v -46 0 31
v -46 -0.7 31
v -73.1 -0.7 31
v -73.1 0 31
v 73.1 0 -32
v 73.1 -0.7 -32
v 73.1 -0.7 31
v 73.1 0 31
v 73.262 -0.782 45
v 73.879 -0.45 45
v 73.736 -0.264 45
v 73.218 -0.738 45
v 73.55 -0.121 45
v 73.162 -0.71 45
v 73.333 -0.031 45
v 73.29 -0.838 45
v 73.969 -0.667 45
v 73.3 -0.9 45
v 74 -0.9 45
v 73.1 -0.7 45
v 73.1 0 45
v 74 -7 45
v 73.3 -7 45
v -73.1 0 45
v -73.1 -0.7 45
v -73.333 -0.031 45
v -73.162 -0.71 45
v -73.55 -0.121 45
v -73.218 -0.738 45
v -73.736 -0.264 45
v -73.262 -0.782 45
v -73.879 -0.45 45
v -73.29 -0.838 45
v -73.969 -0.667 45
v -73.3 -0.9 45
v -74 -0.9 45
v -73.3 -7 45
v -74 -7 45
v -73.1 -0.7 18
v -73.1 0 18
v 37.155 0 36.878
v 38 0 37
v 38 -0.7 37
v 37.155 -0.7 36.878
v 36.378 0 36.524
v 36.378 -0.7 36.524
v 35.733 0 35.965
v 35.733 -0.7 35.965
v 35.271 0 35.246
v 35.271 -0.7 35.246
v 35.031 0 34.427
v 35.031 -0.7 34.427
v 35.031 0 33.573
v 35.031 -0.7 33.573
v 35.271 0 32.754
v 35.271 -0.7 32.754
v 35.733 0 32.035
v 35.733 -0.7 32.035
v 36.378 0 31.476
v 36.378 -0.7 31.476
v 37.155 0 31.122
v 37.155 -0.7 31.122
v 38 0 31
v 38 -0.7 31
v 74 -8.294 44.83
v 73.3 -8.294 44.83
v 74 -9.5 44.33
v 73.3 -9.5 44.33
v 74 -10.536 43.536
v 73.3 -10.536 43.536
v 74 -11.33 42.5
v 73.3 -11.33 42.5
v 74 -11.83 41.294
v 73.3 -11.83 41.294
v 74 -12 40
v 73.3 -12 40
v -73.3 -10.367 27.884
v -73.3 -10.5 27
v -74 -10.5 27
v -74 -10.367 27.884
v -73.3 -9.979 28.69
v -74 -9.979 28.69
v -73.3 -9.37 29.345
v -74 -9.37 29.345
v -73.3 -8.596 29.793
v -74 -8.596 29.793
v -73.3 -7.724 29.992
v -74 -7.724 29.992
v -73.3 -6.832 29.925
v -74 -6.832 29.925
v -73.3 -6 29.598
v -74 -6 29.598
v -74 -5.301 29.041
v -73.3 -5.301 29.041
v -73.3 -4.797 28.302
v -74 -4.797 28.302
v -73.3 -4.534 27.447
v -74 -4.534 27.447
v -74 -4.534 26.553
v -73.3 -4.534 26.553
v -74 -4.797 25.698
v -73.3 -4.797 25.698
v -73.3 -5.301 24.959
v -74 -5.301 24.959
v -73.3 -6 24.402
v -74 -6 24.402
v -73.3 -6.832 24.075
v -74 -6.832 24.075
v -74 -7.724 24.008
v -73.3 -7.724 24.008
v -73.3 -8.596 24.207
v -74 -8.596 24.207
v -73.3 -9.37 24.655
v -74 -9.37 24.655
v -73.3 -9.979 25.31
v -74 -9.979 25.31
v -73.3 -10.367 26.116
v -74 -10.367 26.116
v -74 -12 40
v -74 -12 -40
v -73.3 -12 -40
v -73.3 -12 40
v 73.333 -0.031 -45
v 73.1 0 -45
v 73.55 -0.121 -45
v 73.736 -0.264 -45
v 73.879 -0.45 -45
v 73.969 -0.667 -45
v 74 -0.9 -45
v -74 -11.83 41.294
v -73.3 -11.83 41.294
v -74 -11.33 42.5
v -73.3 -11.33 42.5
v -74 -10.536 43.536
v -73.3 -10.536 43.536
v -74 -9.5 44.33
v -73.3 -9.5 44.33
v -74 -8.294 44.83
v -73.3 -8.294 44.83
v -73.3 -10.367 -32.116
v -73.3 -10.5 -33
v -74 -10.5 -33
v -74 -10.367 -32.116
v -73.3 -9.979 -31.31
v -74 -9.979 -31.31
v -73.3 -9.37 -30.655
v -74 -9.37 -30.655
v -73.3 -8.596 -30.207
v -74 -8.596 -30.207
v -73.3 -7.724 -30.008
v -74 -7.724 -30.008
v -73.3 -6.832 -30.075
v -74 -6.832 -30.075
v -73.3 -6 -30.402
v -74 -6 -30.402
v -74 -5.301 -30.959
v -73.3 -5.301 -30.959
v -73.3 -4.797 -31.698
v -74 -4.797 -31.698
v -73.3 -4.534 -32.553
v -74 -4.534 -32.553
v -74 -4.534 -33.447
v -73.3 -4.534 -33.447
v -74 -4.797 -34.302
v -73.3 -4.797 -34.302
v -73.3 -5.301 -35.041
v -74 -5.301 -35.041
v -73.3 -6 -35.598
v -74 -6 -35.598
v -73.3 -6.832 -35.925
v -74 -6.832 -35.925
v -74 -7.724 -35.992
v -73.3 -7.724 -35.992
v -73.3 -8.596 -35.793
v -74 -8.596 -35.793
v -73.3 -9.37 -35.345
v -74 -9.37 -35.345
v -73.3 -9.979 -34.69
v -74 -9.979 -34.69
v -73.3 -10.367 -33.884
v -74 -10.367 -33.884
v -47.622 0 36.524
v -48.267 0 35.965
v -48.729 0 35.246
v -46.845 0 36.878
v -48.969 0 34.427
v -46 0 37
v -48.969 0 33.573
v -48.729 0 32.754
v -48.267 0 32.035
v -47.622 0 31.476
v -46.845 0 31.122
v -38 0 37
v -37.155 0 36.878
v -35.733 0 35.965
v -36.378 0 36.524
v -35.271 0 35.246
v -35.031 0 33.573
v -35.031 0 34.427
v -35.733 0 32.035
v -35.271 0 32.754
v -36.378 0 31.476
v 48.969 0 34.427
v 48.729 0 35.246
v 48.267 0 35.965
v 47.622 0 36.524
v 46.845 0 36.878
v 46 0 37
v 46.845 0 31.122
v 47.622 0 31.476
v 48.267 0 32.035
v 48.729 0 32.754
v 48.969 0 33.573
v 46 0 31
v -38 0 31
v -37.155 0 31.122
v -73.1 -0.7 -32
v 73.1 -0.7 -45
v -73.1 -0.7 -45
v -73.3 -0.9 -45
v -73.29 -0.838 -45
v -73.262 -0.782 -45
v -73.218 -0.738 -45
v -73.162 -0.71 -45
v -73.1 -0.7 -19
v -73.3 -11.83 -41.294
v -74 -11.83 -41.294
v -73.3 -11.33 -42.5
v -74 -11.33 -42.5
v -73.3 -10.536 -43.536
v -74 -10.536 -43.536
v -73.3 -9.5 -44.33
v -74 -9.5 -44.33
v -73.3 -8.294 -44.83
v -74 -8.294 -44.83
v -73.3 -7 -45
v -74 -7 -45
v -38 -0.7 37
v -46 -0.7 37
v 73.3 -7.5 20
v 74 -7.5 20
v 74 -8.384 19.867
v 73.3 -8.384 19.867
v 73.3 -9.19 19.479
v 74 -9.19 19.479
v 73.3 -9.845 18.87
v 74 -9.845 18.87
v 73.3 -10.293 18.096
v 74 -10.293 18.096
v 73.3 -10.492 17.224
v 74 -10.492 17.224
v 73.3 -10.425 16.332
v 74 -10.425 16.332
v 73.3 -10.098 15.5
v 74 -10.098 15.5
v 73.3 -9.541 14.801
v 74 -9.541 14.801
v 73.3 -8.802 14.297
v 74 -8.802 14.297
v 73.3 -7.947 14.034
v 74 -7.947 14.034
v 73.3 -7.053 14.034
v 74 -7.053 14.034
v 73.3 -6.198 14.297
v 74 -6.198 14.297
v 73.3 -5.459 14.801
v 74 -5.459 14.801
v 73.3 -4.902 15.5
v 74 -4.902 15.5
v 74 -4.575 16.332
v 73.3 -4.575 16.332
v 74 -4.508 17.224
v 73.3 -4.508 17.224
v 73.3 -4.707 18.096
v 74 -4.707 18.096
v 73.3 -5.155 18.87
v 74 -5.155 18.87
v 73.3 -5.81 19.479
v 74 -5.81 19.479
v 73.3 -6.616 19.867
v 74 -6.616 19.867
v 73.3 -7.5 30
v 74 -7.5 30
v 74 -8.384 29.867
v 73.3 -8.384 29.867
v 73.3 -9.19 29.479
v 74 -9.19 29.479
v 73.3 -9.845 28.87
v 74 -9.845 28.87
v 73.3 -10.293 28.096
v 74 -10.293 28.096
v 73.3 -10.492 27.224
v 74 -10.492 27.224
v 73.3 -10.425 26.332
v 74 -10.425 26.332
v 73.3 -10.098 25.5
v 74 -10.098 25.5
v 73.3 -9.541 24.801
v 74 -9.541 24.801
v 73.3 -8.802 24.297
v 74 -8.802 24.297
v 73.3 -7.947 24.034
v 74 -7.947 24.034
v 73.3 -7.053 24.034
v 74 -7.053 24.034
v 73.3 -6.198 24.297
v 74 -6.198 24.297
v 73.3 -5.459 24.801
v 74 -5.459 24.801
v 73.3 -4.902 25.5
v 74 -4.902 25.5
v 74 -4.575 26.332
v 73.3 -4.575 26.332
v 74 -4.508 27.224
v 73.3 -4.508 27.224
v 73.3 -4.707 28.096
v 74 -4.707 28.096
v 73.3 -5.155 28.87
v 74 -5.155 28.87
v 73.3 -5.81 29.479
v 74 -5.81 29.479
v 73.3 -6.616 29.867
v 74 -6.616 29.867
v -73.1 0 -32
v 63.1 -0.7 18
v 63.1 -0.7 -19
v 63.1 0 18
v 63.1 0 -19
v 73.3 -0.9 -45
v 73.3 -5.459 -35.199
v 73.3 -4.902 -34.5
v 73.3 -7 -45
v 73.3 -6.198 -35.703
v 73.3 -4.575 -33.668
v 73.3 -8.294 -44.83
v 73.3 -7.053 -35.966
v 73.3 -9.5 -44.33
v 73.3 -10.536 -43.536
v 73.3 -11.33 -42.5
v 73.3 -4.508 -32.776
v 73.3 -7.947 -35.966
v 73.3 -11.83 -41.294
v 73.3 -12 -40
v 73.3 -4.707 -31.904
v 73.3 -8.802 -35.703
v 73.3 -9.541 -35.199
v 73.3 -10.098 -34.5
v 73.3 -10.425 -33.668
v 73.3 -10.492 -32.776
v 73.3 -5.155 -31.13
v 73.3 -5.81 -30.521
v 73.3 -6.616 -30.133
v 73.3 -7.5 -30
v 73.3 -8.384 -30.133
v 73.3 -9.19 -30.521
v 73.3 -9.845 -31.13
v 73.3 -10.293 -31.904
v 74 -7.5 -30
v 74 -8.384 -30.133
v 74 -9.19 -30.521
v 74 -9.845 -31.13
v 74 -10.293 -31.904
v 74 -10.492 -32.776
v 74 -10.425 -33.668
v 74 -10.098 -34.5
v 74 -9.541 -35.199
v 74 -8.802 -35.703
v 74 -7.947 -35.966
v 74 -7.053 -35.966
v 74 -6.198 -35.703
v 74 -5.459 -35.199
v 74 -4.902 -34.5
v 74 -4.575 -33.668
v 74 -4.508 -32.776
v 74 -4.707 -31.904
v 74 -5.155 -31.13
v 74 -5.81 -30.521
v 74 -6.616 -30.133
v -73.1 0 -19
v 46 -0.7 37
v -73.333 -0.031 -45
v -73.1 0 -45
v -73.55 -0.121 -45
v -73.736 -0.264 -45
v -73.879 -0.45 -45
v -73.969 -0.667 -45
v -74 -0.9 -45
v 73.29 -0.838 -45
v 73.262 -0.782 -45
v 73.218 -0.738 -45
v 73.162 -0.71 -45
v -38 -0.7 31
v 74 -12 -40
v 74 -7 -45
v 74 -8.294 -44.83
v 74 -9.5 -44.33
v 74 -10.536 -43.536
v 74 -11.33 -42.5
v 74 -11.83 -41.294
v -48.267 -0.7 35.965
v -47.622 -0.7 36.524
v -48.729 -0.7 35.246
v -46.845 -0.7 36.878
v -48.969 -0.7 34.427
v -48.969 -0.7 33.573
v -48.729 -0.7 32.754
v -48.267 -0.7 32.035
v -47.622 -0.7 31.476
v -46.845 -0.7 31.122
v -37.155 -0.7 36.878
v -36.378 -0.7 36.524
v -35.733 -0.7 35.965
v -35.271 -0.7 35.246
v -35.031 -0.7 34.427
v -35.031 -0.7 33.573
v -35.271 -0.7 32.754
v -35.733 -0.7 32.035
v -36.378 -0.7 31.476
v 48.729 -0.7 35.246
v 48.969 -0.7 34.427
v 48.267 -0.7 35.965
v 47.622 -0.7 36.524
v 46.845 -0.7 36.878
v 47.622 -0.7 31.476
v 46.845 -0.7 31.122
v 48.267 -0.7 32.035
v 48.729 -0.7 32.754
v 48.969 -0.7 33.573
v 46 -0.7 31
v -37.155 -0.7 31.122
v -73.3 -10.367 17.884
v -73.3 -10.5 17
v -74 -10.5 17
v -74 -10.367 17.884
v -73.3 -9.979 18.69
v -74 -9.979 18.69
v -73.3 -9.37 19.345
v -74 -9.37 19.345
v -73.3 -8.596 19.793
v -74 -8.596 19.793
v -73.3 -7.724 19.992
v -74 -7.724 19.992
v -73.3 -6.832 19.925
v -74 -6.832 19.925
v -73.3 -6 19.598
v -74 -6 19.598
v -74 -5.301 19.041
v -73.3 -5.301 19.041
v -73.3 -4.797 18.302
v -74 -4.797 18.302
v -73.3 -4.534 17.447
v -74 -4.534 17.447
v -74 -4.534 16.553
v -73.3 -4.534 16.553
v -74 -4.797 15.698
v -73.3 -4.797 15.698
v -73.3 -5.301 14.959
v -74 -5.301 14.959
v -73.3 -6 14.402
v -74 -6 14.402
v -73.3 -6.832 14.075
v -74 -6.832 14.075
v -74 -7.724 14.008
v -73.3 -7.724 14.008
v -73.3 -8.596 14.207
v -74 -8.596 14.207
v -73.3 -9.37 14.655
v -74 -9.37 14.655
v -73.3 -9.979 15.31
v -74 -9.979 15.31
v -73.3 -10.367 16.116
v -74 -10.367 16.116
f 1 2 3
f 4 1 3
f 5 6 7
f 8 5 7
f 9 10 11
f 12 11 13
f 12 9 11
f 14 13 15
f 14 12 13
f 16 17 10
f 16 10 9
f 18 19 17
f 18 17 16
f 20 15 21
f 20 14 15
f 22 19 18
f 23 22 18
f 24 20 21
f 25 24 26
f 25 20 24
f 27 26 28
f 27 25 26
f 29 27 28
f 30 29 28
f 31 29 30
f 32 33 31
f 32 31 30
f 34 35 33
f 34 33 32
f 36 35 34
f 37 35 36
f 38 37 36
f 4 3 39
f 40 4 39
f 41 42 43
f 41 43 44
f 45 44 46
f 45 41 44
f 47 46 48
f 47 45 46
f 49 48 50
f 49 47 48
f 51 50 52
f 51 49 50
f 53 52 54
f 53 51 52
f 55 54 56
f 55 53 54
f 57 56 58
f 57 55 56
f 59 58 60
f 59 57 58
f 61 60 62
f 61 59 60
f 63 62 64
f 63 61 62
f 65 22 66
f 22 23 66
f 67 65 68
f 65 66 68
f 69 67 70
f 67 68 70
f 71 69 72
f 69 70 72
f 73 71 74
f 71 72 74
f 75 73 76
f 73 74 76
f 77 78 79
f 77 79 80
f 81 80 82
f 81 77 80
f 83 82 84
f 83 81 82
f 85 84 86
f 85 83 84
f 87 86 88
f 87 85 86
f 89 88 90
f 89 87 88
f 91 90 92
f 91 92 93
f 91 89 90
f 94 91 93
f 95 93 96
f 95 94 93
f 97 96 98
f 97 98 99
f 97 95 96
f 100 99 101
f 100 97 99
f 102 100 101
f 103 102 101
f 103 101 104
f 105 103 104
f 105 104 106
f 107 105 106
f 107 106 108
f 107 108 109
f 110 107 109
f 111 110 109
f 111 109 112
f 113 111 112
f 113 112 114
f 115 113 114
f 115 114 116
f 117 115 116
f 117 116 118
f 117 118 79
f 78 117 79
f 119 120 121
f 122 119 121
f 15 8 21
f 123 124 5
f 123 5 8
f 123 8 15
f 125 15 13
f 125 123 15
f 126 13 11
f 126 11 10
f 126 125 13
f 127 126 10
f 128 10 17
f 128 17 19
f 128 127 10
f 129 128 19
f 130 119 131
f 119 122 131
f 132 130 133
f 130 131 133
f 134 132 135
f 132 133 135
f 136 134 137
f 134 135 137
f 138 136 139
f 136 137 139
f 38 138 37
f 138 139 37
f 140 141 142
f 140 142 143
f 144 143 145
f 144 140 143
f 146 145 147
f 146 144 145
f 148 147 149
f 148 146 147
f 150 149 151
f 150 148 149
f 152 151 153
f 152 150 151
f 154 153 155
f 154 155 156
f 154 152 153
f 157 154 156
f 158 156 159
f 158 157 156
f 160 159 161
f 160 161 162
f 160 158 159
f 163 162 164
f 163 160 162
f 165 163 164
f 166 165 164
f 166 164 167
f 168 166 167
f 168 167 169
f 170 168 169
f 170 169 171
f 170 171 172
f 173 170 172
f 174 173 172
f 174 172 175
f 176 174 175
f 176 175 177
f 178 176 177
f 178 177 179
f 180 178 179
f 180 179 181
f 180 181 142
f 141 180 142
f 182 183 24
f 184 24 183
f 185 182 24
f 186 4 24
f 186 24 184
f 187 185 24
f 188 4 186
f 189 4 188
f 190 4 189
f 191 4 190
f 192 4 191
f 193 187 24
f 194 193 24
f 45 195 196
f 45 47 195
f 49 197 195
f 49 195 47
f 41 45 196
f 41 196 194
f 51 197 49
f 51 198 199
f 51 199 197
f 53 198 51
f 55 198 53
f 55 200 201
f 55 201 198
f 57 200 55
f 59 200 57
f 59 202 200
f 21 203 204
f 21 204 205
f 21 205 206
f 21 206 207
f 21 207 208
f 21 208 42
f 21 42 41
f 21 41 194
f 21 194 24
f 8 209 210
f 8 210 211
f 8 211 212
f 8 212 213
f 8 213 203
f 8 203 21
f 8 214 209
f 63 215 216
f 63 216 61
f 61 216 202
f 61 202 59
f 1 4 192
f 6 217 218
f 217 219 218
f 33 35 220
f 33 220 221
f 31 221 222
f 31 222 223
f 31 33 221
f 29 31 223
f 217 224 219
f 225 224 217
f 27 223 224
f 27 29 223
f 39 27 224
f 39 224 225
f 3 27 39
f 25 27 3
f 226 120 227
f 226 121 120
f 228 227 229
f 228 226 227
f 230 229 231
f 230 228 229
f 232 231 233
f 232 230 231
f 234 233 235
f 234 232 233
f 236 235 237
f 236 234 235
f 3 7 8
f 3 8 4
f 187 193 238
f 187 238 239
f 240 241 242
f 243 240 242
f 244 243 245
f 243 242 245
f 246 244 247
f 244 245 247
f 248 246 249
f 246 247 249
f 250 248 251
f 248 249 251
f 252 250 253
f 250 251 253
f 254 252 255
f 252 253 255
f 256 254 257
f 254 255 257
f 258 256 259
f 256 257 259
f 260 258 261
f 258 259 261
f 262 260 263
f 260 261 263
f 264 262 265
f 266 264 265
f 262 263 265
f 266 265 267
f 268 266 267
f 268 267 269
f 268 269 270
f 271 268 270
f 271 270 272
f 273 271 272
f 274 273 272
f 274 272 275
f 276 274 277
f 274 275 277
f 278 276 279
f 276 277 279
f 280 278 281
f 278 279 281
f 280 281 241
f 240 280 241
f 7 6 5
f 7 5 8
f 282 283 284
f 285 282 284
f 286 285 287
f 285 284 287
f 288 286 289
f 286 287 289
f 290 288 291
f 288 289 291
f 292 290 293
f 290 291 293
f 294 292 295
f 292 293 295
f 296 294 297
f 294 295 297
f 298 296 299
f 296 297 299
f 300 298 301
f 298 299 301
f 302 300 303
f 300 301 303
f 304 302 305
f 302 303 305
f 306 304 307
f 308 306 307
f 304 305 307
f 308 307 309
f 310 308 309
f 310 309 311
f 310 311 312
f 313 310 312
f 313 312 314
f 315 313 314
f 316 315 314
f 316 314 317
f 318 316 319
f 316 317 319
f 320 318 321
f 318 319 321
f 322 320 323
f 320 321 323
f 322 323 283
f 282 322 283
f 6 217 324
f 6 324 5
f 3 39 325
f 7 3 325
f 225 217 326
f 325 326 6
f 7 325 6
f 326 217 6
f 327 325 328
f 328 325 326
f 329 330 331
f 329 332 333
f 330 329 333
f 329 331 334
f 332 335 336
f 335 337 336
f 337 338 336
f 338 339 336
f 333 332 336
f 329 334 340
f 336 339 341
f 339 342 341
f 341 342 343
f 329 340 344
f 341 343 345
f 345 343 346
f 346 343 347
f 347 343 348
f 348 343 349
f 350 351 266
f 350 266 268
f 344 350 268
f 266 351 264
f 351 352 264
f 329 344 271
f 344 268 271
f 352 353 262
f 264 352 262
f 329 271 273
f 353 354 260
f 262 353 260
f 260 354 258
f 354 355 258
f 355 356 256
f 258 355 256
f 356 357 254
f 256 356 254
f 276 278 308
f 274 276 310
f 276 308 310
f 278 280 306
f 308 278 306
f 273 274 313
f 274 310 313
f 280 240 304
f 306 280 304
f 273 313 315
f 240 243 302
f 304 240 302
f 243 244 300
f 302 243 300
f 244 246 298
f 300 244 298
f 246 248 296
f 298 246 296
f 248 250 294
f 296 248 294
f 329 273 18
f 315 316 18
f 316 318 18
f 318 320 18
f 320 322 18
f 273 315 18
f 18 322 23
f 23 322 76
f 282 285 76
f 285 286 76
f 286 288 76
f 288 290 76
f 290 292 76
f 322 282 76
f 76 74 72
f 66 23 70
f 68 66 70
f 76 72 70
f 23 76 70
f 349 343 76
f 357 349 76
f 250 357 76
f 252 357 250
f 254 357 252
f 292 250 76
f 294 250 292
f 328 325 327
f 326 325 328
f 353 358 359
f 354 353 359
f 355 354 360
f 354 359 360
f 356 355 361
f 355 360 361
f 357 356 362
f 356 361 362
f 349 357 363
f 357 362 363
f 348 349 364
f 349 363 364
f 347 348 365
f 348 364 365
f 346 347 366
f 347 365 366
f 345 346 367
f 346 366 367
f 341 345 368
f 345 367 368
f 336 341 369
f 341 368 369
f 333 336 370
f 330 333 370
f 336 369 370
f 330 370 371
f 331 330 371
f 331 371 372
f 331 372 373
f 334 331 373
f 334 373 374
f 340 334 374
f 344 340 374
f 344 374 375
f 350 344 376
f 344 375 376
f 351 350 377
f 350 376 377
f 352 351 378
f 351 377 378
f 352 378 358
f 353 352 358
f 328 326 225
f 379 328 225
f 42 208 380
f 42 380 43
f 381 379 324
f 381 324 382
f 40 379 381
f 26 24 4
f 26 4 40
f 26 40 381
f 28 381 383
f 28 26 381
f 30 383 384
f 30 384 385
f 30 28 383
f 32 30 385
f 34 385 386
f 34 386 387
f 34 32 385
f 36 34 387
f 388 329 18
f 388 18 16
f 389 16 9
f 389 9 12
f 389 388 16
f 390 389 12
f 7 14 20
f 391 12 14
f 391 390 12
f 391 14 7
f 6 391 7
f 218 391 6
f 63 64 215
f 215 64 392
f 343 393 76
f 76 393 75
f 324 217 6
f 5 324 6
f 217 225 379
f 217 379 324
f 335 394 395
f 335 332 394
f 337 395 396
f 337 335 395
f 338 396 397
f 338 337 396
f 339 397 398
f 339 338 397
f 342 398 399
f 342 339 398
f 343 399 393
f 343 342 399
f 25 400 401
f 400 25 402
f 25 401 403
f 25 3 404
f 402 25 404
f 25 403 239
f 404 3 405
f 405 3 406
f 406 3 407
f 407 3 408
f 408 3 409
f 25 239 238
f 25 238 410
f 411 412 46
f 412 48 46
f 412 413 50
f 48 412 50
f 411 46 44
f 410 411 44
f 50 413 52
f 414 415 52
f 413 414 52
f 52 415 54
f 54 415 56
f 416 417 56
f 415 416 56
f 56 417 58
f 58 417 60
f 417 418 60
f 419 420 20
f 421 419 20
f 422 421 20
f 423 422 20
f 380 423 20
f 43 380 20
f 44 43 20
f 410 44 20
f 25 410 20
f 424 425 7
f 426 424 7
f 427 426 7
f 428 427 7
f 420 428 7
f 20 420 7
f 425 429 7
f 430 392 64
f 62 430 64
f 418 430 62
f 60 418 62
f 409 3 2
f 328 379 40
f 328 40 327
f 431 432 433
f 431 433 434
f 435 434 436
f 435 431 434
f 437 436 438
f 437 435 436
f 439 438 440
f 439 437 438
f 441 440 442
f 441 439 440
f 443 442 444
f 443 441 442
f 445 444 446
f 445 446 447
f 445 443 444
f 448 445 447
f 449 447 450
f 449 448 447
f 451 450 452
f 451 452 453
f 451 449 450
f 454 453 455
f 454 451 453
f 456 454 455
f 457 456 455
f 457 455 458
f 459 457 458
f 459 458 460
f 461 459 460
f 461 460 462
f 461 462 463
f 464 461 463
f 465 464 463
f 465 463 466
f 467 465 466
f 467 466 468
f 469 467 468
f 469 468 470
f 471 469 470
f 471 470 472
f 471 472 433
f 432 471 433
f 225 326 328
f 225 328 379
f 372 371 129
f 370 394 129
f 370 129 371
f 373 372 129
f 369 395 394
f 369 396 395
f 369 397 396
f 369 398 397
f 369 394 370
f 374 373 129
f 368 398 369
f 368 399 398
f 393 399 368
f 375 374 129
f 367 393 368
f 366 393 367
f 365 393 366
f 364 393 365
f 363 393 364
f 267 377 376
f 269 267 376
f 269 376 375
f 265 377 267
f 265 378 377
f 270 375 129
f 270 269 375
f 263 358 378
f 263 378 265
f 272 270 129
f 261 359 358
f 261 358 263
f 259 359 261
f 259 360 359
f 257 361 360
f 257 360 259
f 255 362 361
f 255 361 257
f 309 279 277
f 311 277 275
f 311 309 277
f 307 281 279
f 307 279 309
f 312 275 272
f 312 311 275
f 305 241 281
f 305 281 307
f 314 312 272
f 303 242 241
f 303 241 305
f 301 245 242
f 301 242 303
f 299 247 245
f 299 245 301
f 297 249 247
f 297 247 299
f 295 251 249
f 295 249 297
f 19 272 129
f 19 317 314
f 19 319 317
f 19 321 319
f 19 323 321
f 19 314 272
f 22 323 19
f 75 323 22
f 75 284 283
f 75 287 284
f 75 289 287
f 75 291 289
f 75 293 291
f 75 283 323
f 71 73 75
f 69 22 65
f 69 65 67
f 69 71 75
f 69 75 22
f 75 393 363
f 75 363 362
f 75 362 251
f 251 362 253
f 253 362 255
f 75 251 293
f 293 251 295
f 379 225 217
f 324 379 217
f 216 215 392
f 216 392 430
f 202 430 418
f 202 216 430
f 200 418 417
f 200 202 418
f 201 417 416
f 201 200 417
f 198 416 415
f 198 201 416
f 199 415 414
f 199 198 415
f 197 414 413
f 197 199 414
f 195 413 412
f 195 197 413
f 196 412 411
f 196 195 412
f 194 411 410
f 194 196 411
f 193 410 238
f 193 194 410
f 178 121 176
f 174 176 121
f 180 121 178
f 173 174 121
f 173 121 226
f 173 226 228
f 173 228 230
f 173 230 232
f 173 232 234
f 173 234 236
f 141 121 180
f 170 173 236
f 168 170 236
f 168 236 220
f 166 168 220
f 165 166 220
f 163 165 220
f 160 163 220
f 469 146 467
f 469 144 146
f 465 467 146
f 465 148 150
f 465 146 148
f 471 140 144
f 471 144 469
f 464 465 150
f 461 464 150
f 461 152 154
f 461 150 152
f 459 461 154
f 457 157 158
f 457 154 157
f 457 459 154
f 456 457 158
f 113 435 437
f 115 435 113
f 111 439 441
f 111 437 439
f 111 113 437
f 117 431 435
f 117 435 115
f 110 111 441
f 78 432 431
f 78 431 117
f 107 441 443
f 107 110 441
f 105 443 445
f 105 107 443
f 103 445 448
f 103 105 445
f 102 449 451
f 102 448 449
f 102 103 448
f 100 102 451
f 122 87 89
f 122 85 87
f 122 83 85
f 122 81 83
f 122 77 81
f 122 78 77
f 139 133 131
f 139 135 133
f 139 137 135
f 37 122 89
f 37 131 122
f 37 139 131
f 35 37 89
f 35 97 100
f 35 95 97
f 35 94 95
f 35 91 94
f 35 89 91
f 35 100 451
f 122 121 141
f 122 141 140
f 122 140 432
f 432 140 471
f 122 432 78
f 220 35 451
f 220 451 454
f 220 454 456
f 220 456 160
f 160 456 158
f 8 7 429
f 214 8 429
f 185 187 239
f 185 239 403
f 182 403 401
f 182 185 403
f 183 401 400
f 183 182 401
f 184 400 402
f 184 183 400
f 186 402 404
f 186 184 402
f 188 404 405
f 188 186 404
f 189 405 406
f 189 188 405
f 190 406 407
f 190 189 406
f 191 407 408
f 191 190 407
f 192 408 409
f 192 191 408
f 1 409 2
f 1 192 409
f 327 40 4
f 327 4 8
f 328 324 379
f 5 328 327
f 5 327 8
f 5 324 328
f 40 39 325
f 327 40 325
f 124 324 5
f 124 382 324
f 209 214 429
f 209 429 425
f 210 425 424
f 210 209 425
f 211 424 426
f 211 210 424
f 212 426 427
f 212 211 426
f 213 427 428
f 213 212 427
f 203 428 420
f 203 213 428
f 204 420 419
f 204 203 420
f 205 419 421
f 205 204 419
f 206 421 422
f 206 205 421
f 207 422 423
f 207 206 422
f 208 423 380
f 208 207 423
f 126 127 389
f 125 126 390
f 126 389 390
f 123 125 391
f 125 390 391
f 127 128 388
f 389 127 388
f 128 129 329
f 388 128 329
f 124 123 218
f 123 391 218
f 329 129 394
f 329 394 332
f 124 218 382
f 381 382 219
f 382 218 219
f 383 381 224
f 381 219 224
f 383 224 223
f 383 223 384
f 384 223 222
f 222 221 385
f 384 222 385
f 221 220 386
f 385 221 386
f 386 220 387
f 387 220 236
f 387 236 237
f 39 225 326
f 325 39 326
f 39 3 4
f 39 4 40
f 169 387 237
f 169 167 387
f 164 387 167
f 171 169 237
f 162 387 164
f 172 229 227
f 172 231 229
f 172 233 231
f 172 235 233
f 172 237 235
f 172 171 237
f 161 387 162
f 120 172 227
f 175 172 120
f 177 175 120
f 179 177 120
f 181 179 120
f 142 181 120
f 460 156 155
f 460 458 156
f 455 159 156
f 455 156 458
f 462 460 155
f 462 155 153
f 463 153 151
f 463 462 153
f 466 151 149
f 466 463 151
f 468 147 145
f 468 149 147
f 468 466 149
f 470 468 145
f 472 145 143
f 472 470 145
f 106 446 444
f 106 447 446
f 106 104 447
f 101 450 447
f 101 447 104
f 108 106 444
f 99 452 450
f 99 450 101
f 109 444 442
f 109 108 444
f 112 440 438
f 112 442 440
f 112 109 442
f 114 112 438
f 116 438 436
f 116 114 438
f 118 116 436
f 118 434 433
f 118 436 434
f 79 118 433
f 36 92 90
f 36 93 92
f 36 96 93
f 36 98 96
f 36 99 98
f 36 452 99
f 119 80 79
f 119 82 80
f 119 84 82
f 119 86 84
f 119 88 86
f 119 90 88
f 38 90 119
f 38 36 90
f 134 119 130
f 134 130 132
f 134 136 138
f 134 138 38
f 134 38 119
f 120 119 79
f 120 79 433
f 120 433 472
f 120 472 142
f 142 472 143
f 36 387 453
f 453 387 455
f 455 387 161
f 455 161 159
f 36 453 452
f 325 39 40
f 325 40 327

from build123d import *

# Parameters (mm, degrees)
SKETCH_1_W                         = 148
SKETCH_1_H                         = 90
SM_BASE_FLANGE_1_DEPTH             = 0.7
SM_EDGE_FLANGE_1_STRIP_W           = 3.2
SM_EDGE_FLANGE_1_STRIP_H           = 0.7
SM_EDGE_FLANGE_1_STRIP_CUT_DEPTH   = 90
SM_EDGE_FLANGE_1_STRIP_2_W         = 3.2
SM_EDGE_FLANGE_1_STRIP_2_H         = 0.7
SM_EDGE_FLANGE_1_STRIP_CUT_2_DEPTH = 90
SM_EDGE_FLANGE_1_DEPTH             = 90
SM_EDGE_FLANGE_1_PROFILE_W         = 90
SM_EDGE_FLANGE_1_PROFILE_H         = 11.1
SM_EDGE_FLANGE_1_PROFILE_R         = 3
SM_EDGE_FLANGE_1_FLAT_DEPTH        = 0.7
SM_EDGE_FLANGE_1_BEND_DEPTH        = 90
FILLET_2_R                         = 5
CUT_EXTRUDE_START                  = -10
SKETCH_15_R                        = 3
CUT_EXTRUDE_1_DEPTH                = 10
SPLIT_BODIES_1_SURFACE_1_BACK      = 174.632
SPLIT_BODIES_1_SURFACE_1_DEPTH     = 349.264
SPLIT_BODIES_1_SURFACE_2_BACK      = 174.632
SPLIT_BODIES_1_SURFACE_2_DEPTH     = 349.264


# Sheet-metal steps are written as plain solids
with BuildPart() as part:
    # Sketch 1 → 基体-法兰1 (new body)
    with BuildSketch(Plane(origin=(0, 0, 0), x_dir=(1, 0, 0), z_dir=(0, 1, 0))):
        Rectangle(SKETCH_1_W, SKETCH_1_H)
        with BuildLine():
            Line((-46, -31), (-38, -31))
            ThreePointArc((-38, -31), (-35, -34), (-38, -37))
            Line((-38, -37), (-46, -37))
            ThreePointArc((-46, -37), (-49, -34), (-46, -31))
        make_face(mode=Mode.SUBTRACT)
        with BuildLine():
            Line((38, -31), (46, -31))
            ThreePointArc((46, -31), (49, -34), (46, -37))
            Line((46, -37), (38, -37))
            ThreePointArc((38, -37), (35, -34), (38, -31))
        make_face(mode=Mode.SUBTRACT)
    extrude(amount=-SM_BASE_FLANGE_1_DEPTH)

    # 边线-法兰1 strip (across the edge) → 边线-法兰1 strip cut (cut)
    with BuildSketch(Plane(origin=(74, -0.7, -45), x_dir=(-1, 0, 0), z_dir=(0, 0, 1))):
        with Locations((-0.7, -0.35)):
            Rectangle(SM_EDGE_FLANGE_1_STRIP_W, SM_EDGE_FLANGE_1_STRIP_H)
    extrude(amount=SM_EDGE_FLANGE_1_STRIP_CUT_DEPTH, mode=Mode.SUBTRACT)

    # 边线-法兰1 strip 2 (across the edge) → 边线-法兰1 strip cut 2 (cut)
    with BuildSketch(Plane(origin=(-74, -0.7, 45), x_dir=(1, 0, 0), z_dir=(0, 0, -1))):
        with Locations((-0.7, -0.35)):
            Rectangle(SM_EDGE_FLANGE_1_STRIP_2_W, SM_EDGE_FLANGE_1_STRIP_2_H)
    extrude(amount=SM_EDGE_FLANGE_1_STRIP_CUT_2_DEPTH, mode=Mode.SUBTRACT)

    # 边线-法兰1 bend section (across the edge) → 边线-法兰1 (add)
    with BuildSketch(Plane(origin=(74, -0.7, -45), x_dir=(-1, 0, 0), z_dir=(0, 0, 1))):
        with BuildLine():
            Line((0, 0.2), (0.7, 0.2))
            ThreePointArc((0.7, 0.2), (0.758578644, 0.058578644), (0.9, 0))
            Line((0.9, 0), (0.9, -0.7))
            ThreePointArc((0.9, -0.7), (0.263603897, -0.436396103), (0, 0.2))
        make_face()
    extrude(amount=SM_EDGE_FLANGE_1_DEPTH)

    # 边线-法兰1 profile (on flange) → 边线-法兰1 flat (add)
    with BuildSketch(Plane(origin=(74, -0.7, 0), x_dir=(0, 0, 1), z_dir=(1, 0, 0))):
        with Locations((0, 5.75)):
            Rectangle(SM_EDGE_FLANGE_1_PROFILE_W, SM_EDGE_FLANGE_1_PROFILE_H)
        with Locations((17, 6.8)):
            Circle(SM_EDGE_FLANGE_1_PROFILE_R, mode=Mode.SUBTRACT)
        with Locations((27, 6.8)):
            Circle(SM_EDGE_FLANGE_1_PROFILE_R, mode=Mode.SUBTRACT)
        with Locations((-33, 6.8)):
            Circle(SM_EDGE_FLANGE_1_PROFILE_R, mode=Mode.SUBTRACT)
    extrude(amount=-SM_EDGE_FLANGE_1_FLAT_DEPTH)

    # 边线-法兰1 section (across the edge) → 边线-法兰1 bend (add)
    with BuildSketch(Plane(origin=(-74, -0.7, 45), x_dir=(1, 0, 0), z_dir=(0, 0, -1))):
        with BuildLine():
            Line((0, 0.2), (0, 11.3))
            Line((0, 11.3), (0.7, 11.3))
            Line((0.7, 11.3), (0.7, 0.2))
            ThreePointArc((0.7, 0.2), (0.758578644, 0.058578644), (0.9, 0))
            Line((0.9, 0), (0.9, -0.7))
            ThreePointArc((0.9, -0.7), (0.263603897, -0.436396103), (0, 0.2))
        make_face()
    extrude(amount=SM_EDGE_FLANGE_1_BEND_DEPTH)

    # 圆角2
    fillet_2_edges = [part.edges().sort_by_distance(p)[0] for p in [
        (-73.65, -12, 45),
        (-73.65, -12, -45),
        (73.65, -12, -45),
        (73.65, -12, 45),
    ]]
    fillet(fillet_2_edges, radius=FILLET_2_R)

    # 草图15 → 切除-拉伸1 (cut)
    with BuildSketch(Plane.ZY.offset(74).offset(CUT_EXTRUDE_START)):
        with Locations(Location((-33, -7.5, 0), (0, 0, 270))):
            Circle(SKETCH_15_R)
        with Locations(Location((17, -7.5, 0), (0, 0, 270))):
            Circle(SKETCH_15_R)
        with Locations(Location((27, -7.5, 0), (0, 0, 270))):
            Circle(SKETCH_15_R)
    extrude(amount=CUT_EXTRUDE_1_DEPTH, mode=Mode.SUBTRACT)


with BuildPart() as body_2:
    # Split Bodies 1: the piece behind the surface
    add(part.part)
    # Split Bodies 1 surface: a surface, the sketch's curves swept straight by 349.264 mm
    with BuildLine(Plane(origin=(0, 0, 0), x_dir=(1, 0, 0), z_dir=(0, 1, 0)).offset(-SPLIT_BODIES_1_SURFACE_1_BACK), mode=Mode.PRIVATE) as split_bodies_1_surface_1_path:
        Line((-73.1, 32), (73.1, 32))
        Line((73.1, 32), (73.1, -31))
        Line((73.1, -31), (-73.1, -31))
        Line((-73.1, -31), (-73.1, -18))
        Line((-73.1, -18), (63.1, -18))
        Line((63.1, -18), (63.1, 19))
        Line((63.1, 19), (-73.1, 19))
        Line((-73.1, 19), (-73.1, 32))
    split_bodies_1_surface_1 = Shell.extrude(split_bodies_1_surface_1_path.wire(), (0 * SPLIT_BODIES_1_SURFACE_1_DEPTH, 1 * SPLIT_BODIES_1_SURFACE_1_DEPTH, 0 * SPLIT_BODIES_1_SURFACE_1_DEPTH))
    split(bisect_by=split_bodies_1_surface_1, keep=Keep.BOTTOM)


with BuildPart() as part_1:
    add(part.part)

    # Split Bodies 1: split by a surface, the side it looks to stays
    # Split Bodies 1 surface: a surface, the sketch's curves swept straight by 349.264 mm
    with BuildLine(Plane(origin=(0, 0, 0), x_dir=(1, 0, 0), z_dir=(0, 1, 0)).offset(-SPLIT_BODIES_1_SURFACE_2_BACK), mode=Mode.PRIVATE) as split_bodies_1_surface_2_path:
        Line((-73.1, 32), (73.1, 32))
        Line((73.1, 32), (73.1, -31))
        Line((73.1, -31), (-73.1, -31))
        Line((-73.1, -31), (-73.1, -18))
        Line((-73.1, -18), (63.1, -18))
        Line((63.1, -18), (63.1, 19))
        Line((63.1, 19), (-73.1, 19))
        Line((-73.1, 19), (-73.1, 32))
    split_bodies_1_surface_2 = Shell.extrude(split_bodies_1_surface_2_path.wire(), (0 * SPLIT_BODIES_1_SURFACE_2_DEPTH, 1 * SPLIT_BODIES_1_SURFACE_2_DEPTH, 0 * SPLIT_BODIES_1_SURFACE_2_DEPTH))
    split(bisect_by=split_bodies_1_surface_2, keep=Keep.TOP)


solid = Compound([body_2.part, part_1.part])
